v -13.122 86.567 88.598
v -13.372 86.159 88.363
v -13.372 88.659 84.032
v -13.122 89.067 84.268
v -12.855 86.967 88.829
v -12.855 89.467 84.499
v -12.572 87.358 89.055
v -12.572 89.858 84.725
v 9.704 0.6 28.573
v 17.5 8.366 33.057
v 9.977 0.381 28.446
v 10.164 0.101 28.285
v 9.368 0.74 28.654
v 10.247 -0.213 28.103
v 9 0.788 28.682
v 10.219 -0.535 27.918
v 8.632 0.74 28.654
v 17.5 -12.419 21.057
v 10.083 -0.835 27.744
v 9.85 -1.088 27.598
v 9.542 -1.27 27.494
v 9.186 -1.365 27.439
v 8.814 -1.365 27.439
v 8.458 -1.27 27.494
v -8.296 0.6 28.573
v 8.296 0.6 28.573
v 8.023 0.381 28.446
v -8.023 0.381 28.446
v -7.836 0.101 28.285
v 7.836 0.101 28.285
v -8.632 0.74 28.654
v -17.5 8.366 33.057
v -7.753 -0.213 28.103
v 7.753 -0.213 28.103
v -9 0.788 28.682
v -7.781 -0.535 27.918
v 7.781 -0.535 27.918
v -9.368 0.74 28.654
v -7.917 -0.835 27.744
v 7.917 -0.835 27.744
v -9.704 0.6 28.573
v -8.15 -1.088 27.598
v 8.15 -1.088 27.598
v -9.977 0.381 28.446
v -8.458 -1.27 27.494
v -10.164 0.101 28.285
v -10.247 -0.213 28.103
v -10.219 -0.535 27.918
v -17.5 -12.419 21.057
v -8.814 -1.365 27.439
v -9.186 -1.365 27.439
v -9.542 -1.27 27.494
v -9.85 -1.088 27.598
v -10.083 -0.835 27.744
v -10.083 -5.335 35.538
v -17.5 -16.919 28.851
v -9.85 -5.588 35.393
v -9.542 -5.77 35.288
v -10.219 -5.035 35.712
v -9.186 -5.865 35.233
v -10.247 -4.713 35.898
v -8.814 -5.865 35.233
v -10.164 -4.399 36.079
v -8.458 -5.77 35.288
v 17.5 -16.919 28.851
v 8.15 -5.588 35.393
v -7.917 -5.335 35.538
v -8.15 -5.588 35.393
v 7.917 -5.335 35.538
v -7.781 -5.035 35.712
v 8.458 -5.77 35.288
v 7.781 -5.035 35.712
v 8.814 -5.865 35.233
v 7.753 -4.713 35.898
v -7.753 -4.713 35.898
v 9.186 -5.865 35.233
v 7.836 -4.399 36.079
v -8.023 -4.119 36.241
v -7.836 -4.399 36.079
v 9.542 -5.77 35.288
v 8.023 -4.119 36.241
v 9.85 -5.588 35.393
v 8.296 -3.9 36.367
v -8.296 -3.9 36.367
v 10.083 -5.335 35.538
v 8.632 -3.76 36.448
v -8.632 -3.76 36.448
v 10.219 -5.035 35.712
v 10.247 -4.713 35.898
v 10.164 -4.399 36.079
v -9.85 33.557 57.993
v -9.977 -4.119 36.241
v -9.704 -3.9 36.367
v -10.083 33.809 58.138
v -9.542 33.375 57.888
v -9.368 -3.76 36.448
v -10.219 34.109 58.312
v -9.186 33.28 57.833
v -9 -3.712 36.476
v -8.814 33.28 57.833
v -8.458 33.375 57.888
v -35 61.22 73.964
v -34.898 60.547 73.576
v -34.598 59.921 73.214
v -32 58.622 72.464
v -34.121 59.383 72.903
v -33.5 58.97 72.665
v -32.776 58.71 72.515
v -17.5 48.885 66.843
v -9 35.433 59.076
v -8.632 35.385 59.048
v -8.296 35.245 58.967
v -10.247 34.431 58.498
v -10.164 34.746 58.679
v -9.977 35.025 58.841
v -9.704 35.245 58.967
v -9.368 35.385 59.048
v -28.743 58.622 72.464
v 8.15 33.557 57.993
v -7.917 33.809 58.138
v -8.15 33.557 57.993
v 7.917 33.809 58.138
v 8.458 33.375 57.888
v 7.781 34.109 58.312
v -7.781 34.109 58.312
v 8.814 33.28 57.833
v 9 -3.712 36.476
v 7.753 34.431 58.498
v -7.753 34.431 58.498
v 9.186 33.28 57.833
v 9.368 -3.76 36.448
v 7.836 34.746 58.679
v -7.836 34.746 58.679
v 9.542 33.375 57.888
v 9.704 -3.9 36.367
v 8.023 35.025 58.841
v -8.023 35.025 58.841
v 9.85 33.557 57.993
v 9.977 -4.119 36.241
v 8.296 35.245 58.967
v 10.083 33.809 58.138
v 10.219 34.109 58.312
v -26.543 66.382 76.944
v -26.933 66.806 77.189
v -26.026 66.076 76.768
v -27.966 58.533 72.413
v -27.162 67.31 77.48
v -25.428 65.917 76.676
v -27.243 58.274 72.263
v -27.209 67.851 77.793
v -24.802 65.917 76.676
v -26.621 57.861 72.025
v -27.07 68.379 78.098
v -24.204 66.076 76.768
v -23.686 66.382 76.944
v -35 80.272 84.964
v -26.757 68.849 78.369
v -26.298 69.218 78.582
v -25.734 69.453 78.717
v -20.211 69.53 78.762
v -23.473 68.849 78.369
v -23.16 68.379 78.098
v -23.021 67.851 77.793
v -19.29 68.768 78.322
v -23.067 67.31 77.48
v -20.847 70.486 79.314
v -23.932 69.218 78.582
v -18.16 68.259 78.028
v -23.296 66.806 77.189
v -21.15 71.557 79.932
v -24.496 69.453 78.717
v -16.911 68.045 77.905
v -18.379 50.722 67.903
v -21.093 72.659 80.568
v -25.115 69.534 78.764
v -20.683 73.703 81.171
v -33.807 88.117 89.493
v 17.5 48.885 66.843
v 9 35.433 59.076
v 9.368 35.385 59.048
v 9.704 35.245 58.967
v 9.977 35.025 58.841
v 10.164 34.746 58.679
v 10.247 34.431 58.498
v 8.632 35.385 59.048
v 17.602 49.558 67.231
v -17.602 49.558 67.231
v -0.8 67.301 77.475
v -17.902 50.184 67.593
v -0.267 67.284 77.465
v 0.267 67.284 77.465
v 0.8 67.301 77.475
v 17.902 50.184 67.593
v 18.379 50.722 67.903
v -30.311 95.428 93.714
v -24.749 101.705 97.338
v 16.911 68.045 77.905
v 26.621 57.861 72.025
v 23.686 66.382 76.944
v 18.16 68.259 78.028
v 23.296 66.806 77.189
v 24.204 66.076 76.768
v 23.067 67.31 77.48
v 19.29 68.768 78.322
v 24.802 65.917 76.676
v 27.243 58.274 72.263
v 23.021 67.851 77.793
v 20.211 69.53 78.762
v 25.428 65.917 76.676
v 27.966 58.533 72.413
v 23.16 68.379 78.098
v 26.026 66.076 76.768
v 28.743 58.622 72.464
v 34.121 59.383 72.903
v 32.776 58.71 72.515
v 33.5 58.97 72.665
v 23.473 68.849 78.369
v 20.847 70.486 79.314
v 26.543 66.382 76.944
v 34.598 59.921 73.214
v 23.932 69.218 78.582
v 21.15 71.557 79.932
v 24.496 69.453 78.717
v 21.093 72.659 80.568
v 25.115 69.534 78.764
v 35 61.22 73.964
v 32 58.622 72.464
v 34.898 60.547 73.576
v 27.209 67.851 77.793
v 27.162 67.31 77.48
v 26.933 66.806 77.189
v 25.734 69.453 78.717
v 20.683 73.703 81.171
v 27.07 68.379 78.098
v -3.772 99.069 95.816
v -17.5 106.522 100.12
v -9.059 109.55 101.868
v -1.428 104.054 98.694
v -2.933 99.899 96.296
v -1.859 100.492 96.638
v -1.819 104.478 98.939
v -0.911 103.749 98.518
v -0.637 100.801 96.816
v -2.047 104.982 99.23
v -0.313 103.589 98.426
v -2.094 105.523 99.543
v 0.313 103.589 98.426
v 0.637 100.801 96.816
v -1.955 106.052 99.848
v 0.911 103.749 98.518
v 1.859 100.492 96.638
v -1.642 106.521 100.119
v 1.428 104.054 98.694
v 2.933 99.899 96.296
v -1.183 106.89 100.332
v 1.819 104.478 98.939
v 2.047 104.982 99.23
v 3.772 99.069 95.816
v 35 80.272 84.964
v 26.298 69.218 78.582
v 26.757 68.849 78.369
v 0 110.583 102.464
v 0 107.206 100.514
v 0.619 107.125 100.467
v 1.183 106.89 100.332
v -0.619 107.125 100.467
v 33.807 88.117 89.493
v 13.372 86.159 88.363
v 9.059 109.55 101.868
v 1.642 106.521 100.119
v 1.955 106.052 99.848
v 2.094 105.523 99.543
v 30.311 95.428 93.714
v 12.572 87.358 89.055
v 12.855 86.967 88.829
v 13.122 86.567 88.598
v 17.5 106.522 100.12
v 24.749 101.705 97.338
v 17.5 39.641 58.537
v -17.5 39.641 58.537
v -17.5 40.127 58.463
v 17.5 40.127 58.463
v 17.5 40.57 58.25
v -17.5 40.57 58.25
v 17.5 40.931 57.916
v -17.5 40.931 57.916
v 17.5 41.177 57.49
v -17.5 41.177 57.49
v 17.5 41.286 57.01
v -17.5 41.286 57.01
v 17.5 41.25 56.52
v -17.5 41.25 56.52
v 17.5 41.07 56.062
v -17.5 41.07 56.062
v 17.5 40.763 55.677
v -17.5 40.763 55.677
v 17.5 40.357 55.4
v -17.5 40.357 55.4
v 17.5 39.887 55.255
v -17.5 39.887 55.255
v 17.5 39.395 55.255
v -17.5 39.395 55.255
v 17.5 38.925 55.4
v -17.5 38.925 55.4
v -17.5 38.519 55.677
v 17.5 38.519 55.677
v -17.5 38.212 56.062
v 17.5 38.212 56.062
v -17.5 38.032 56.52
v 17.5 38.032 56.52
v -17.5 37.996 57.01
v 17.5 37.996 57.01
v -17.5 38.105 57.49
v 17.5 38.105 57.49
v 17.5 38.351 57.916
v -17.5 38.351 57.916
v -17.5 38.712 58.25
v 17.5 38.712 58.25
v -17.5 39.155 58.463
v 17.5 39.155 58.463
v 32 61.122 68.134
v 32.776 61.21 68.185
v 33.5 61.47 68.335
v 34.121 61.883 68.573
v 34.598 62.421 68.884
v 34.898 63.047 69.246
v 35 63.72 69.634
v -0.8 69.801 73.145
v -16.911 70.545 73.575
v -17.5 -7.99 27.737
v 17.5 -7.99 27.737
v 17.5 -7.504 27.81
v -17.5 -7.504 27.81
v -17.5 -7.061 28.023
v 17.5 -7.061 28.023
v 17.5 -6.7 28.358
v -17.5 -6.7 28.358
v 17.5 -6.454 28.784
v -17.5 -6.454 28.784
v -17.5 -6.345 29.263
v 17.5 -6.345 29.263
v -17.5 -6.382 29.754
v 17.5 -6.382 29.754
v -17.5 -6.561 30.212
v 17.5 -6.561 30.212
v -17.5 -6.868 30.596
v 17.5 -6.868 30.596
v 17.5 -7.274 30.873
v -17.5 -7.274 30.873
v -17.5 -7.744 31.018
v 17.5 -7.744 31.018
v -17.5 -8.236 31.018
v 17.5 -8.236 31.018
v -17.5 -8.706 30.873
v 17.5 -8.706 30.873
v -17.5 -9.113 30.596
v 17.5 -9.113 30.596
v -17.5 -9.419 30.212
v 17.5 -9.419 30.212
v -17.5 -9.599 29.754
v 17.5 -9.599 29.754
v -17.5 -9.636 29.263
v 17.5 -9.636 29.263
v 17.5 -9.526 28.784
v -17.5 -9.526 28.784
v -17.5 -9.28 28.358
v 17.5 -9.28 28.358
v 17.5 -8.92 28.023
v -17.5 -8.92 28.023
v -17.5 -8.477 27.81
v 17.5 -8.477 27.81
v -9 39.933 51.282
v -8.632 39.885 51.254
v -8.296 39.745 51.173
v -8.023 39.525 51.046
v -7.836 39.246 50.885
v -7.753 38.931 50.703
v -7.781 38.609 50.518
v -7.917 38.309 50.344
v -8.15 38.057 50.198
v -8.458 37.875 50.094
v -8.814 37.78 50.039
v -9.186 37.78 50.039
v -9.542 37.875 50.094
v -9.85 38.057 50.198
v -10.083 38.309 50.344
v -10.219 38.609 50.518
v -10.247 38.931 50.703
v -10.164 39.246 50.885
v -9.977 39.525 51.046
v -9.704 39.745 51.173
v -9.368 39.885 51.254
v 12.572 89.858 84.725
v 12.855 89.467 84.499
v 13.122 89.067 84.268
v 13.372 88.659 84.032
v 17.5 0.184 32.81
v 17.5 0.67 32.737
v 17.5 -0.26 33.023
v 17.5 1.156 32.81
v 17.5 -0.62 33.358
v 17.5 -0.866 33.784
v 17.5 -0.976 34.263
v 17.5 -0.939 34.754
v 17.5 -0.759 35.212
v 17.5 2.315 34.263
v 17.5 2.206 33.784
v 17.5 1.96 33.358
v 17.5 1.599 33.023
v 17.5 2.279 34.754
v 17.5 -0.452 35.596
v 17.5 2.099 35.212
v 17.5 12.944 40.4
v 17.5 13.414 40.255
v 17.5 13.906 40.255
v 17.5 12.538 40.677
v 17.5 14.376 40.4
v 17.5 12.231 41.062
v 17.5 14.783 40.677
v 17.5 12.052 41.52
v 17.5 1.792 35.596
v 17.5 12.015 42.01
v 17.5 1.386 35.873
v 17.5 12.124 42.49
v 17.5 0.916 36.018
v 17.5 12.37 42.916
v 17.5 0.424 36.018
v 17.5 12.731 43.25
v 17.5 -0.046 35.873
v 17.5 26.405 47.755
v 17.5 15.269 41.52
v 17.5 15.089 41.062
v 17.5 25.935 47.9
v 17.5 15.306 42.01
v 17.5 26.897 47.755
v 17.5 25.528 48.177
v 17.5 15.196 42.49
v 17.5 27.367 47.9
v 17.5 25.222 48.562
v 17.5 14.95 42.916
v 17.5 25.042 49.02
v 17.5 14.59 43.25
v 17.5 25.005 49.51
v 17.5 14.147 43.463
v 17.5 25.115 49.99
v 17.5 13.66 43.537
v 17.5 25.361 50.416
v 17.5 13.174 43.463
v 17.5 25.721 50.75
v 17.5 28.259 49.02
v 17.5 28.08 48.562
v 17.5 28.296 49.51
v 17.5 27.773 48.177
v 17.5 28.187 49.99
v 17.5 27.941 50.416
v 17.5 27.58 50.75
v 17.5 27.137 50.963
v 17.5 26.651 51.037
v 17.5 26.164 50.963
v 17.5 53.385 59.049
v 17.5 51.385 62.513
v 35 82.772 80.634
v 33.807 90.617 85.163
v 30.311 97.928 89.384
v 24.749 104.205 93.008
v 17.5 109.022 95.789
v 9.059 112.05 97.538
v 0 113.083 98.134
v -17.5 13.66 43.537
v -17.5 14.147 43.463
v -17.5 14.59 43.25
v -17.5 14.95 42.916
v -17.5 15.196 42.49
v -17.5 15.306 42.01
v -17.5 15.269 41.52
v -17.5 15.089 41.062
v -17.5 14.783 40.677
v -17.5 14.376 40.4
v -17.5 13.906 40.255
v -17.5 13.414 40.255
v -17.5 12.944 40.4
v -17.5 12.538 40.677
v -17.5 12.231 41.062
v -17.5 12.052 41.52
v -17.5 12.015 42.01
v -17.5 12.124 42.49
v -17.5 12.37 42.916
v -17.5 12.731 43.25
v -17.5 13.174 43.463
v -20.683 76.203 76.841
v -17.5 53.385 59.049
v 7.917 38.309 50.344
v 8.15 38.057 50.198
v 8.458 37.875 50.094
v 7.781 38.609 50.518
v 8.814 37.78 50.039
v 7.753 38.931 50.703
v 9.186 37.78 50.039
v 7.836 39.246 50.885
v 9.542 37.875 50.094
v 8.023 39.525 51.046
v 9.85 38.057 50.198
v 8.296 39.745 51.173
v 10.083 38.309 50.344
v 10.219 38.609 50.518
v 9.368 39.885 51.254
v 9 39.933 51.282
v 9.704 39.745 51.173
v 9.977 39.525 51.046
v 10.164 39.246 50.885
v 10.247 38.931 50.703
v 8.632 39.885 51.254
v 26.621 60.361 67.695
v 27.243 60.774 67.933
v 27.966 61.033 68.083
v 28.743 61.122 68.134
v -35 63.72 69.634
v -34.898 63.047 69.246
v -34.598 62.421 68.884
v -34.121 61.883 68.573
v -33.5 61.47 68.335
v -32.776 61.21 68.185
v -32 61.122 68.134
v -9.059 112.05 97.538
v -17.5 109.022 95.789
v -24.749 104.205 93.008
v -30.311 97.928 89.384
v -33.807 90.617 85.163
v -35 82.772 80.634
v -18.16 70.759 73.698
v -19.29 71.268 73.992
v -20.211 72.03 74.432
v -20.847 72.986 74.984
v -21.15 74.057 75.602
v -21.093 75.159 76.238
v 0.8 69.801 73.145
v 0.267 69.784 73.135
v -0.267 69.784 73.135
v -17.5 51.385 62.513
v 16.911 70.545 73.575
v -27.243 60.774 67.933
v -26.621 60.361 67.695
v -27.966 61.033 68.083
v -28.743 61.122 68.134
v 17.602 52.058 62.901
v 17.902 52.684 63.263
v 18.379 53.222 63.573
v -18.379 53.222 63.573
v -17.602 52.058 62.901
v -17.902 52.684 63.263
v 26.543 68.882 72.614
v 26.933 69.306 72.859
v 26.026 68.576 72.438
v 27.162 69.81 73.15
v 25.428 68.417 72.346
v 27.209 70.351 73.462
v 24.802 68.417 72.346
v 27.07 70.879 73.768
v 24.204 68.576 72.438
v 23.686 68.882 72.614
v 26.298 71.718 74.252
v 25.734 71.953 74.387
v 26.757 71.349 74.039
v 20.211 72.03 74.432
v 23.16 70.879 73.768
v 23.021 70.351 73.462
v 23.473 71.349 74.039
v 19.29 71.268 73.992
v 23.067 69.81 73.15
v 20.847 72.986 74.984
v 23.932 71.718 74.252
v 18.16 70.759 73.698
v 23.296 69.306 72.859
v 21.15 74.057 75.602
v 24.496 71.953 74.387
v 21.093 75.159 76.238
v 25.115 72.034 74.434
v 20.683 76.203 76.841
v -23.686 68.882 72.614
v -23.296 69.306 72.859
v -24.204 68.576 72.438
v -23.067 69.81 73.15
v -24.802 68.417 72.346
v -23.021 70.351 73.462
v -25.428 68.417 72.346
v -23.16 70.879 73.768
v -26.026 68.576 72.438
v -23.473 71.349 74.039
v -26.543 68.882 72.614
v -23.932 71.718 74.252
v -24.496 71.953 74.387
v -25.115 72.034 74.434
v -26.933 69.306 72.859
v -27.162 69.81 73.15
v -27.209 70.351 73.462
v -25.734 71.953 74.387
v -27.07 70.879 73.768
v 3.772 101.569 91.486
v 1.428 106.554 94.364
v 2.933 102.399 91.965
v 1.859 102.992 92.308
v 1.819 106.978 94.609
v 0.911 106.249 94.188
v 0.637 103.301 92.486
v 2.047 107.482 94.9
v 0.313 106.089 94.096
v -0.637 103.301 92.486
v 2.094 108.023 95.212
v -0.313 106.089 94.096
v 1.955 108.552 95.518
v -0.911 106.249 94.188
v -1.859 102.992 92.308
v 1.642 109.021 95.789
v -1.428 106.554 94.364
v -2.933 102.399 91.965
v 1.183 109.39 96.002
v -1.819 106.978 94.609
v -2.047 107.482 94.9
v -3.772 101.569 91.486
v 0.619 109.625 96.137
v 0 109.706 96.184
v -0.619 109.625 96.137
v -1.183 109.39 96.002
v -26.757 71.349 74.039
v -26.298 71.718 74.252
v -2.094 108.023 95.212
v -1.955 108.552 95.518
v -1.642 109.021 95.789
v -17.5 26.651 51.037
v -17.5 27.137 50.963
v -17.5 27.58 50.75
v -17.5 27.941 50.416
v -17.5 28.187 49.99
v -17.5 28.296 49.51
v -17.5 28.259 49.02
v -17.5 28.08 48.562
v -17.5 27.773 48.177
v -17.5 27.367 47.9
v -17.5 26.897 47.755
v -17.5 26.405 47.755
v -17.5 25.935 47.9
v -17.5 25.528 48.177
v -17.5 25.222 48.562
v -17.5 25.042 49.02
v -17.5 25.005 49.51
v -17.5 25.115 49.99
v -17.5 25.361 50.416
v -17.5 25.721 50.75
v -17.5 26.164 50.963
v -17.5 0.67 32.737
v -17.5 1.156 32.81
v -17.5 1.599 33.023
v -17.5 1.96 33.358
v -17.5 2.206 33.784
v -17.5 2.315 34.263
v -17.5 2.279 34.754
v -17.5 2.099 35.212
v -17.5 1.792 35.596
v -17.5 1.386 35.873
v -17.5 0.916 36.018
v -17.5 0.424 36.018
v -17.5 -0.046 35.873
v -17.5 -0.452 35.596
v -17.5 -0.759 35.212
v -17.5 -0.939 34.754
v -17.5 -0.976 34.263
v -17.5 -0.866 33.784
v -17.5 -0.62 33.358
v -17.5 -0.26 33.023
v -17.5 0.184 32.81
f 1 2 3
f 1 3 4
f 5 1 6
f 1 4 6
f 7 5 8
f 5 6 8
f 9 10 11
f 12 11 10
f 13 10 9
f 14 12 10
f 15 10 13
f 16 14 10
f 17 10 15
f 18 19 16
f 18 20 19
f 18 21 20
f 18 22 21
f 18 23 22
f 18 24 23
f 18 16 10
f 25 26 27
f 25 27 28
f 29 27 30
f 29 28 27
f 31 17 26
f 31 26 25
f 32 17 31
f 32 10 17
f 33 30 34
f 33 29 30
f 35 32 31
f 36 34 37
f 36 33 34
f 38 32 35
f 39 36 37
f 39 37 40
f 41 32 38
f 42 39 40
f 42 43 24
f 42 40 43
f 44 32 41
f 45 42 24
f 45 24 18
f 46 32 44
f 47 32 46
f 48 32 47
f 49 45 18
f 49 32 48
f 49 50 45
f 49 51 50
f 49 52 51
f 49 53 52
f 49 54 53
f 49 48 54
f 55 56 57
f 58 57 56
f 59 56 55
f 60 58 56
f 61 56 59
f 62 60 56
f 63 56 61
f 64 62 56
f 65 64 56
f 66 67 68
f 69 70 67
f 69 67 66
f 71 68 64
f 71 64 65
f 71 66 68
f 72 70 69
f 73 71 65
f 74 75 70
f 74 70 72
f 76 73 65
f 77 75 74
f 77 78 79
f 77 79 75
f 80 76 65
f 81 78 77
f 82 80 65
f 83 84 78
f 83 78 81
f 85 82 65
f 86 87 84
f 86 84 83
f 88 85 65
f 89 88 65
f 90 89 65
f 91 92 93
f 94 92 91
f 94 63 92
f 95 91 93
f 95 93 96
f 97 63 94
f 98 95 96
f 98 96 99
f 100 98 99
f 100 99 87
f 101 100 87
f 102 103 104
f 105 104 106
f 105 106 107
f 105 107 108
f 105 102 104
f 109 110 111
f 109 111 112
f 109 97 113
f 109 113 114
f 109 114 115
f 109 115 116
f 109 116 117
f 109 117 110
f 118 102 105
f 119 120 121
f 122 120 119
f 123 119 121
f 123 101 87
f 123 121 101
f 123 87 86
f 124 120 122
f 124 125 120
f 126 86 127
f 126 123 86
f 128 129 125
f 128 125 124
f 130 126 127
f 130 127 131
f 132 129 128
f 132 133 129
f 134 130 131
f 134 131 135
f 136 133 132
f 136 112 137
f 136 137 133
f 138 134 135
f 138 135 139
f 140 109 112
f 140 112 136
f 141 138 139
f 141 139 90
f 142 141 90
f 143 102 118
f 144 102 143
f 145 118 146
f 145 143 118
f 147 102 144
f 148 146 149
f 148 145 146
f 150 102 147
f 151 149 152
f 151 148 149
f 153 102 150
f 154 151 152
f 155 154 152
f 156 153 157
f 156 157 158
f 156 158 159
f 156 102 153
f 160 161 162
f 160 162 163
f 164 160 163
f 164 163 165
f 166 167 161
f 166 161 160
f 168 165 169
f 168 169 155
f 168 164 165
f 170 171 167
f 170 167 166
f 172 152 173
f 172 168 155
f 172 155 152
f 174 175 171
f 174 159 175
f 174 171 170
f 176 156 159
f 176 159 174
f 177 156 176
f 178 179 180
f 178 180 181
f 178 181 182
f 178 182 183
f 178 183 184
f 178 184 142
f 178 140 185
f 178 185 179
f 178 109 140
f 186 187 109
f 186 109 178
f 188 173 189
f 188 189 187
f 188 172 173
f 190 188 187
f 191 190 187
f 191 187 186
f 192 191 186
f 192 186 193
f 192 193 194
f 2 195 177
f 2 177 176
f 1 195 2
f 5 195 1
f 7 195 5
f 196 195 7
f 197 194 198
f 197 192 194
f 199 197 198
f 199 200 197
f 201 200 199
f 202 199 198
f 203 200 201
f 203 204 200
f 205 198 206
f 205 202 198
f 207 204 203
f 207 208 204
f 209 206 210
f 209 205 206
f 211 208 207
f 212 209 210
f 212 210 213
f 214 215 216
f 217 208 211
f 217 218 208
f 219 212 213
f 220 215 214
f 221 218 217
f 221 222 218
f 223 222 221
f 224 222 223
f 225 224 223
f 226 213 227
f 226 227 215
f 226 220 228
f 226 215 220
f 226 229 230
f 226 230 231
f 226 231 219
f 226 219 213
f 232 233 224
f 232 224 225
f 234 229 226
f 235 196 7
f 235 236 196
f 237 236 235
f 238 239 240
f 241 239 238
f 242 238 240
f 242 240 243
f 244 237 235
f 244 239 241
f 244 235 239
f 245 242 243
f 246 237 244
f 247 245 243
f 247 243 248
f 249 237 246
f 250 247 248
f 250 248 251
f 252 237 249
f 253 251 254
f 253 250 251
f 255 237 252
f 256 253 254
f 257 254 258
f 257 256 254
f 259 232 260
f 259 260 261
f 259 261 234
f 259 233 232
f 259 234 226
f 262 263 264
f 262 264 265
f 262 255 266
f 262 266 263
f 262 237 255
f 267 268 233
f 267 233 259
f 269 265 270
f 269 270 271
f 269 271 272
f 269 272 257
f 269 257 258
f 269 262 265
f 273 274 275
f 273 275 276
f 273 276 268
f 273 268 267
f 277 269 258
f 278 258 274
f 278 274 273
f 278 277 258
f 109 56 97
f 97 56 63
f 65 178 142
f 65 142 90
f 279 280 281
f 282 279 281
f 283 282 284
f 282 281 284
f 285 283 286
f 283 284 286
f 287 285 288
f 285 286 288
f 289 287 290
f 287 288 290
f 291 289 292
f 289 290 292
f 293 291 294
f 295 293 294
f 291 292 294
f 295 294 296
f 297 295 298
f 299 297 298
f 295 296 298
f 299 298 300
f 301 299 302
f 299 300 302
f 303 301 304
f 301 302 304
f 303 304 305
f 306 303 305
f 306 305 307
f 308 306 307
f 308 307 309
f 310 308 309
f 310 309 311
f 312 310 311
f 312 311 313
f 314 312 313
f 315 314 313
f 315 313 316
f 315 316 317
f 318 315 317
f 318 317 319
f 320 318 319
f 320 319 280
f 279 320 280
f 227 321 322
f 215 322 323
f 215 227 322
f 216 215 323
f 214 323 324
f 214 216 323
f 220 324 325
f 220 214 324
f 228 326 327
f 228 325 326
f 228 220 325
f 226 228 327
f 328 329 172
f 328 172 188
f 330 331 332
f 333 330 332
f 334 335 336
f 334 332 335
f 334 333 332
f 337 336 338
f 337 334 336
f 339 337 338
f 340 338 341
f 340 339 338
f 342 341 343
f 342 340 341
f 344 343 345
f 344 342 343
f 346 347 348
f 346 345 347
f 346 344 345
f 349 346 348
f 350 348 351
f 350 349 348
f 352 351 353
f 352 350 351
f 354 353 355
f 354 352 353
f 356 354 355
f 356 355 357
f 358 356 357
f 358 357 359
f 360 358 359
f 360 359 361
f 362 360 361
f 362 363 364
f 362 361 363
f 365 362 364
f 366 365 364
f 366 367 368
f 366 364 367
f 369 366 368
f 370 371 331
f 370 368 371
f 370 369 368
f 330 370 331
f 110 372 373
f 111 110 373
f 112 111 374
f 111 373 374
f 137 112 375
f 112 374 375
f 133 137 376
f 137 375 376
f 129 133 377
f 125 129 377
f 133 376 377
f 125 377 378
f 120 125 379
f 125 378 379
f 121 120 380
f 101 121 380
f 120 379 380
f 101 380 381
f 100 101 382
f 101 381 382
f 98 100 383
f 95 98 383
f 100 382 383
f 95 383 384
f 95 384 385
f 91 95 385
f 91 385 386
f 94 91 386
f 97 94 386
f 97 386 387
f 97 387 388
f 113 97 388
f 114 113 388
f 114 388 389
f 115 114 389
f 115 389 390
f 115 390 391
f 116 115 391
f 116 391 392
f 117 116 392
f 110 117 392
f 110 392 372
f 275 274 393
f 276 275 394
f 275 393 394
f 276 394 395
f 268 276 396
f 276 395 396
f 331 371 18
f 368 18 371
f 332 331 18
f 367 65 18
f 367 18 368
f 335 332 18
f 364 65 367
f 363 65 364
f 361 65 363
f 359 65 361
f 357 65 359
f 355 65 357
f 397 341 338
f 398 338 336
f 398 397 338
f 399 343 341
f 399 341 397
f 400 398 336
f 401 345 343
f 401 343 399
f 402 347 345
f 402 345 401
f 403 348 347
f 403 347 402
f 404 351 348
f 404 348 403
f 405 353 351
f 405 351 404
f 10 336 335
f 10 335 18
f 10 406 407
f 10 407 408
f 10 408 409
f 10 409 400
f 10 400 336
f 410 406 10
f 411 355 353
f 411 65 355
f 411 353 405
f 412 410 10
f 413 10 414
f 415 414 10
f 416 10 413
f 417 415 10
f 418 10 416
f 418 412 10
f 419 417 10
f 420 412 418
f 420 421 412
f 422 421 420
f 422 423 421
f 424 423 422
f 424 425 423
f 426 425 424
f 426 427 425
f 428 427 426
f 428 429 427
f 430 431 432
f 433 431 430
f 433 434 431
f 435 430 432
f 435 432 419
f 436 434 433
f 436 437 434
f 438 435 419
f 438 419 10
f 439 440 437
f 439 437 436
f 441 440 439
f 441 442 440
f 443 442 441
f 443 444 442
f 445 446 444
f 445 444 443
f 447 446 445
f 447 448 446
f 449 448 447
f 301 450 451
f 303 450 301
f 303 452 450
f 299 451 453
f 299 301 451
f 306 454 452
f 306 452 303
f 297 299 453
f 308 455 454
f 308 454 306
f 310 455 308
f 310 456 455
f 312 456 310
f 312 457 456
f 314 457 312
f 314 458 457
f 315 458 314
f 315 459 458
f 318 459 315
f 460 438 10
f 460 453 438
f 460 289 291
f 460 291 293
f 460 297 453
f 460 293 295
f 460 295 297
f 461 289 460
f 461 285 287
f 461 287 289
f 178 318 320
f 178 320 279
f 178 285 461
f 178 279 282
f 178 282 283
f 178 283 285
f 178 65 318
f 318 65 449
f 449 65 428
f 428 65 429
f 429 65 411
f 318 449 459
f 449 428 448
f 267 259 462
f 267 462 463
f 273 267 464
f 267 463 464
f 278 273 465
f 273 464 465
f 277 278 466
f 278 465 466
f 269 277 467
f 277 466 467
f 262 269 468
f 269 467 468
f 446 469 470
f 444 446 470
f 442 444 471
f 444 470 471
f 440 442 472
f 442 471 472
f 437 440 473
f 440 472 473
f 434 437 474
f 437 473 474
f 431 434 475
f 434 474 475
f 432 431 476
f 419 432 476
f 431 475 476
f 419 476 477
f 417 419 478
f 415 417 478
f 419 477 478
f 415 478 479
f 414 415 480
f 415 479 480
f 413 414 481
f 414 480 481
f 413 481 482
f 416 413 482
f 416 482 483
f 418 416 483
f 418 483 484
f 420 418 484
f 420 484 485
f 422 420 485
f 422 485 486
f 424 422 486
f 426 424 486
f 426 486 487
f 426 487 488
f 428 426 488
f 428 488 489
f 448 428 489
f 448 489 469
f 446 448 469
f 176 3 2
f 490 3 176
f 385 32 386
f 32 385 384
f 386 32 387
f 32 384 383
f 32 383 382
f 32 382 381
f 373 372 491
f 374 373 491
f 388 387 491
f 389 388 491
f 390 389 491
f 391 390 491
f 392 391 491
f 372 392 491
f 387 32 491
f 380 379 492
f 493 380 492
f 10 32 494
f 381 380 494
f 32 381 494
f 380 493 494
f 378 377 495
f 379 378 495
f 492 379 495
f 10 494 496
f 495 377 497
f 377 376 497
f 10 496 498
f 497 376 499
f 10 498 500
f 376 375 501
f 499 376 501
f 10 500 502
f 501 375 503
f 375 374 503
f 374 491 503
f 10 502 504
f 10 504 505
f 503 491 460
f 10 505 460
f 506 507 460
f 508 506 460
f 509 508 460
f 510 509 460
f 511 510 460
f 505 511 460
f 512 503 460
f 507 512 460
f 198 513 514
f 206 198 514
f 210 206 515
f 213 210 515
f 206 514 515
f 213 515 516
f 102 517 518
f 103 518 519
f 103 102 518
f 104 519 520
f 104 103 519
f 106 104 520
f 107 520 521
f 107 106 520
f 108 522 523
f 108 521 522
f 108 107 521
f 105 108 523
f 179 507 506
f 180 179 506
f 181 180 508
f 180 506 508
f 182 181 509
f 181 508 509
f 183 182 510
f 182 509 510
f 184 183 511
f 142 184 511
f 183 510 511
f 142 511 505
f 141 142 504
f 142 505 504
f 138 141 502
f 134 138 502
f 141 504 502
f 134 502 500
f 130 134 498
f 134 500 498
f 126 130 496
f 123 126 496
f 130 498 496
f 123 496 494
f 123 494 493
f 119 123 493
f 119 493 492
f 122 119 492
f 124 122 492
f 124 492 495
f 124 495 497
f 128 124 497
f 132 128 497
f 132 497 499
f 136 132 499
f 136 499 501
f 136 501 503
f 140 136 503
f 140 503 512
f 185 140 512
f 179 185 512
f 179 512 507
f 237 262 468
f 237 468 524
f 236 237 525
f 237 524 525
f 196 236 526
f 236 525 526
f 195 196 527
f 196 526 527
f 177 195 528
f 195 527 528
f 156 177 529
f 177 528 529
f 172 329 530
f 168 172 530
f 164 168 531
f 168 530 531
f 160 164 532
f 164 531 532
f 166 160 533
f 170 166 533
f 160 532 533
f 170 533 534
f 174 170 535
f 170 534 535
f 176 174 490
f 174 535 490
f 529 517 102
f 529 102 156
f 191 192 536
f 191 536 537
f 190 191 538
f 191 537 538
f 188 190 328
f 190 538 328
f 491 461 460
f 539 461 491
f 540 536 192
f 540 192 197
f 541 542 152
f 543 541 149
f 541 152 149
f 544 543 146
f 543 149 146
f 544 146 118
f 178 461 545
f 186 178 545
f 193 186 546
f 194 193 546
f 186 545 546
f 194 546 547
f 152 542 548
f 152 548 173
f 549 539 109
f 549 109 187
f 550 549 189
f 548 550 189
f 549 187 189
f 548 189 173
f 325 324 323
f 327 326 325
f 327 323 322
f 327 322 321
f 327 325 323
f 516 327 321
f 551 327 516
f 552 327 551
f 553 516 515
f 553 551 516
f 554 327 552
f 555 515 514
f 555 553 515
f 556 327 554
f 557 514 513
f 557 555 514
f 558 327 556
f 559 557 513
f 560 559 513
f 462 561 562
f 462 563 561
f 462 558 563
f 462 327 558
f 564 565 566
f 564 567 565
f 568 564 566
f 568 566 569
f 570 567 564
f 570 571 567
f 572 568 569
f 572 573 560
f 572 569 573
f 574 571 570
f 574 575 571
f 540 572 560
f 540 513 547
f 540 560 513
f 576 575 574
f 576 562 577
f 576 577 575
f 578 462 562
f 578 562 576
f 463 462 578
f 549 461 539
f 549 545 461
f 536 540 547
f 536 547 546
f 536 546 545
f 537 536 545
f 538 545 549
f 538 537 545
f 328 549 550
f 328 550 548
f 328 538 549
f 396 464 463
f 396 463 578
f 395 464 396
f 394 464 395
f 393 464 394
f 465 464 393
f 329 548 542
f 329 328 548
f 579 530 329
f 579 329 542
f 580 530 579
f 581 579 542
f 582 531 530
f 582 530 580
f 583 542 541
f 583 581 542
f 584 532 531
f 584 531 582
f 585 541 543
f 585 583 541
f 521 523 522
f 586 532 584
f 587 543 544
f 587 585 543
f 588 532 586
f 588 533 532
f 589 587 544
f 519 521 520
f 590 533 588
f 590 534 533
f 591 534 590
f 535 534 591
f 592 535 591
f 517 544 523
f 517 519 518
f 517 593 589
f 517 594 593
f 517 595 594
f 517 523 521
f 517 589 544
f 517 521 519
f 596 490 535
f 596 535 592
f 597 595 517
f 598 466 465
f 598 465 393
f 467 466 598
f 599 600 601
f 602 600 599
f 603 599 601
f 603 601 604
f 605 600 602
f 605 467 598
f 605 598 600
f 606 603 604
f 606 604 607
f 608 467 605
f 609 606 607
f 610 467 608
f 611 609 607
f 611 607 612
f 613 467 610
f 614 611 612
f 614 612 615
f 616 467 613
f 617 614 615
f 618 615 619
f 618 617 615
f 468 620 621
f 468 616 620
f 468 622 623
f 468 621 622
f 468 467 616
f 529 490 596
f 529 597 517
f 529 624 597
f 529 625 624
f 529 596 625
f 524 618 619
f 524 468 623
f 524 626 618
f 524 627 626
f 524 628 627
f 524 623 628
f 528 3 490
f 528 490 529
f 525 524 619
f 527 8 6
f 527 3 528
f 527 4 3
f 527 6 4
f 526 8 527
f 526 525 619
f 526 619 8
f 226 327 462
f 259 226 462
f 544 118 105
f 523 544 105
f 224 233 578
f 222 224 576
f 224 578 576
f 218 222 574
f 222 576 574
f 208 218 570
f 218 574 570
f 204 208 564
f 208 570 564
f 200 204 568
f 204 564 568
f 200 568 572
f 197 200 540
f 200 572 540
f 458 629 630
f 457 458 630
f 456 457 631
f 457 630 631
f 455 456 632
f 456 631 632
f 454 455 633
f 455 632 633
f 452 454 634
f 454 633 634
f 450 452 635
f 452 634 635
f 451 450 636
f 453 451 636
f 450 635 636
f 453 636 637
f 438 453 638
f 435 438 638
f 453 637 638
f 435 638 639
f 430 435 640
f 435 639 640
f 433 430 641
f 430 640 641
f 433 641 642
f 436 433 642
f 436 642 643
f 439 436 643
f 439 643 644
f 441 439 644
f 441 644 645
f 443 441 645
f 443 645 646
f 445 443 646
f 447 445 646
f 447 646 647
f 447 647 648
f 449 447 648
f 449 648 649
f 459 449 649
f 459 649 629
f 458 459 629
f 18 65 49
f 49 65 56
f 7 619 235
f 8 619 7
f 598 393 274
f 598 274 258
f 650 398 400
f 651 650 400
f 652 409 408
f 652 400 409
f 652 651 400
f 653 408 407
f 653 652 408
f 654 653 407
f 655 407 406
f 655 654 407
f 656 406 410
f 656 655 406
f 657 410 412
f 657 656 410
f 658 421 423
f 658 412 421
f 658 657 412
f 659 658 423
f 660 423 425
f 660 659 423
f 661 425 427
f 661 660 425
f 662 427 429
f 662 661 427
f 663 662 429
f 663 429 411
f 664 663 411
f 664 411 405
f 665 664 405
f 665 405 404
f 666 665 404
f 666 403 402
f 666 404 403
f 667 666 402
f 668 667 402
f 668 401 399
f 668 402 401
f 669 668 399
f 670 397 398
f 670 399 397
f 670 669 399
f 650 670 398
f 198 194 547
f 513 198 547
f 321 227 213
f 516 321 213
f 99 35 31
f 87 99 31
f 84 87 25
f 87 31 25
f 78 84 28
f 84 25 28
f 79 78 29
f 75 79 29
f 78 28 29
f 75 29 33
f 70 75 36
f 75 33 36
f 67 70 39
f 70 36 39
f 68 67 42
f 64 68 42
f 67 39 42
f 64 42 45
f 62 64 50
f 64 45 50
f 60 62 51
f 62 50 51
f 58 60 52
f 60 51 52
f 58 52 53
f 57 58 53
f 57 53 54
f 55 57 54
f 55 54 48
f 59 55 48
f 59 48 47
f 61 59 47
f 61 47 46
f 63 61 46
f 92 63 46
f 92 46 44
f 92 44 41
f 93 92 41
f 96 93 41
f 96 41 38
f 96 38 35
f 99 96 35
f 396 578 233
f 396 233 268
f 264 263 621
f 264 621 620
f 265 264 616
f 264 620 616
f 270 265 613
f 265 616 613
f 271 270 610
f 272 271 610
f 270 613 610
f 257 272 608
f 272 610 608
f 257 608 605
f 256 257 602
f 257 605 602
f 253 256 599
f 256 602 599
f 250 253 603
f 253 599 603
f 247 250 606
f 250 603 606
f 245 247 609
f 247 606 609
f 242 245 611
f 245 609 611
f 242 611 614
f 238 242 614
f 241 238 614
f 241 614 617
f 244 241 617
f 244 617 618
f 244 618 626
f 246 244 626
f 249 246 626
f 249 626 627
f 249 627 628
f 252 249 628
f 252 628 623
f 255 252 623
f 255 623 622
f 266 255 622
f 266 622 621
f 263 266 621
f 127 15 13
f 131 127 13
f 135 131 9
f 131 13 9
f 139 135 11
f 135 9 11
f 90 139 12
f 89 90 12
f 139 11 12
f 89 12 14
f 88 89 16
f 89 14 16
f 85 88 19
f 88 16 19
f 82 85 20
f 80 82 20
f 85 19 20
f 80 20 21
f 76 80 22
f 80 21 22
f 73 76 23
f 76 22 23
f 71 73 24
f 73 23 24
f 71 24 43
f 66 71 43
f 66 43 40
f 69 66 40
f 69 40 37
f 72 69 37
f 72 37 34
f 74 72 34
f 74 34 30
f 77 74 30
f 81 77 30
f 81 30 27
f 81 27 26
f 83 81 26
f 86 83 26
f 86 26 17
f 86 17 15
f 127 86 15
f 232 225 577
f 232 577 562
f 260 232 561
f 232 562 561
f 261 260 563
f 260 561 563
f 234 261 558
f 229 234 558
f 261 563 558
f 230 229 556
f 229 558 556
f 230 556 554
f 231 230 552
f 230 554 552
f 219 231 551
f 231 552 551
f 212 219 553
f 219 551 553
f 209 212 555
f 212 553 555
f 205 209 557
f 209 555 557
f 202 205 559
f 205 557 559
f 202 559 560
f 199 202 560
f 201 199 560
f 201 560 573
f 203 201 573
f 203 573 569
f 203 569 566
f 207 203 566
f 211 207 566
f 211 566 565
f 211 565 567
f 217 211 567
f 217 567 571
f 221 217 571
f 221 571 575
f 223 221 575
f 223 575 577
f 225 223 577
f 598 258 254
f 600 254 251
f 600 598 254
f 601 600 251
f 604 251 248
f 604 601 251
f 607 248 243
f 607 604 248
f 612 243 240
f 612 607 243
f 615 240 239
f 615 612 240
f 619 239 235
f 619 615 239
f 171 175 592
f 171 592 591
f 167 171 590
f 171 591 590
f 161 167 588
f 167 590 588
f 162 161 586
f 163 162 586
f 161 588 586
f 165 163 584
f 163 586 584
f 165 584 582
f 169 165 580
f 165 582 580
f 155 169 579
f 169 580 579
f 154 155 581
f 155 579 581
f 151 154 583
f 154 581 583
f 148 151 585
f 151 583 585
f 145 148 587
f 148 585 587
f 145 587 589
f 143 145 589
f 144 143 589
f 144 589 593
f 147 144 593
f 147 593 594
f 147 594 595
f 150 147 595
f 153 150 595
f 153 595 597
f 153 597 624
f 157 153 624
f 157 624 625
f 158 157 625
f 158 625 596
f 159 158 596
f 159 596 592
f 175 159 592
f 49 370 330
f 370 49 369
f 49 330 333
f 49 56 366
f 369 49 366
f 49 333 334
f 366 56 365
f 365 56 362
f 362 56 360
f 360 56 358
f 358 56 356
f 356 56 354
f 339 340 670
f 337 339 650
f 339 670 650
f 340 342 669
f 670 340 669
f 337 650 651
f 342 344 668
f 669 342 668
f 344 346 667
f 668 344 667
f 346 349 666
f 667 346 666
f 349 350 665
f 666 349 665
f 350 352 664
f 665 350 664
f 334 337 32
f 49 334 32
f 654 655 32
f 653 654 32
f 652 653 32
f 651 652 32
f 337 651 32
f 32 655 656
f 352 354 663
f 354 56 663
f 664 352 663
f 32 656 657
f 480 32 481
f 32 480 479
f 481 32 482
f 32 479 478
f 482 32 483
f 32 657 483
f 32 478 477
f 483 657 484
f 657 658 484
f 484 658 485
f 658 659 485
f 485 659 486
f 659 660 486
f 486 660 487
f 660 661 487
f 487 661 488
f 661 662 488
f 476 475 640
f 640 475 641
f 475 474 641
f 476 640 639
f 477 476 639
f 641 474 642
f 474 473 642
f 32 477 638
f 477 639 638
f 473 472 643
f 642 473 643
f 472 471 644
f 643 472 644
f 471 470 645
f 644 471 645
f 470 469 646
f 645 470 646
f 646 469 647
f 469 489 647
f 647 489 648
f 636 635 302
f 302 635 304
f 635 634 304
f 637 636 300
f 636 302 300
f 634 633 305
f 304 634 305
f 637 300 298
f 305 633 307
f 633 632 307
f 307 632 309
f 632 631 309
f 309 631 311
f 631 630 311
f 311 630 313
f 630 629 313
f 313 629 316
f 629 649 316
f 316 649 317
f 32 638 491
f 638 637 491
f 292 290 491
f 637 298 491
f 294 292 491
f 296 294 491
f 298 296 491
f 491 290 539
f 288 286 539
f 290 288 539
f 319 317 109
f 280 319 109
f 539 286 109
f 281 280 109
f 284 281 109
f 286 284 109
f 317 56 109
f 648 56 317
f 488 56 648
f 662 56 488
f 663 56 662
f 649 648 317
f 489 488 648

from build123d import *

# Parameters (mm, degrees)
SKETCH_1_W                = 35
SKETCH_1_H                = 10
EXTRUDE_1_DEPTH           = 30
SKETCH_2_R                = 1.65
CUT_EXTRUDE_1_DEPTH       = 47.368092477
SKETCH_3_W                = 35
SKETCH_3_H                = 10
FILLET_1_R                = 5
SKETCH_6_W                = 70
SKETCH_6_H                = 60
EXTRUDE_2_DEPTH           = 10
CHAMFER_1_SIZE            = 10
CUT_EXTRUDE_3_DEPTH       = 15
SKETCH_8_R                = 15
CUT_EXTRUDE_4_DEPTH       = 15
SKETCH_10_R               = 2.1
CUT_EXTRUDE_6_DEPTH       = 156.505811286
SKETCH_11_R               = 4.5
CUT_EXTRUDE_7_DEPTH       = 156.505811286
CUT_EXTRUDE_12_DEPTH      = 25
CUT_EXTRUDE_10_DEPTH      = 156.505811286
CUT_EXTRUDE_10_DEPTH_BACK = 156.505811286
SKETCH_14_W               = 35
SKETCH_14_H               = 27.103629711
SKETCH_15_W               = 35
SKETCH_15_H               = 10
EXTRUDE_3_DEPTH           = 23
CUT_EXTRUDE_11_DEPTH      = 164.332579917
CUT_EXTRUDE_11_DEPTH_BACK = 164.332579917
SKETCH_16_R               = 1.65
FILLET_2_R                = 3
CUT_EXTRUDE_START         = -4
CUT_EXTRUDE_13_DEPTH      = 4
SKETCH_19_W               = 35
SKETCH_19_H               = 24
EXTRUDE_4_DEPTH           = 6
CUT_EXTRUDE_14_DEPTH      = 162.92960956
CUT_EXTRUDE_14_DEPTH_BACK = 162.92960956
SKETCH_20_R               = 1.65
CUT_EXTRUDE_15_DEPTH      = 1
SKETCH_22_R               = 1.65
CUT_EXTRUDE_16_DEPTH      = 162.378361072
CUT_EXTRUDE_17_DEPTH      = 162.378361072
CUT_EXTRUDE_17_DEPTH_BACK = 162.378361072
SKETCH_25_R               = 1.25
CUT_EXTRUDE_18_DEPTH      = 10


with BuildPart() as part:
    # 草图1 → 凸台-拉伸1 (new body)
    with BuildSketch(Plane.XY):
        Rectangle(SKETCH_1_W, SKETCH_1_H)
    extrude(amount=EXTRUDE_1_DEPTH)

    # 草图2 → 切除-拉伸1 (cut, through all)
    with BuildSketch(Plane(origin=(17.5, 0, 0), x_dir=(0, 0, -1), z_dir=(1, 0, 0))):
        with Locations((-26, 0)):
            Circle(SKETCH_2_R)
        with Locations((-4, 0)):
            Circle(SKETCH_2_R)
    extrude(amount=-CUT_EXTRUDE_1_DEPTH, mode=Mode.SUBTRACT)

    # 扫描3: sweep along a path in 草图4
    with BuildLine(Plane(origin=(0, 0, 0), x_dir=(0, 0, -1), z_dir=(1, 0, 0))) as sweep_3_path:
        Line((-30, 0), (-31.113248654, 0))
        ThreePointArc((-31.113248654, 0), (-33.613248654, 0.669872981), (-35.443375673, 2.5))
        Line((-35.443375673, 2.5), (-99, 112.583302492))
    # 草图3 → 扫描3 (sweep)
    with BuildSketch(Plane.XY.offset(30)):
        Rectangle(SKETCH_3_W, SKETCH_3_H)
    sweep(path=sweep_3_path.line)

    # 圆角1
    fillet_1_edges = [part.edges().sort_by_distance(p)[0] for p in [
        (0, 5, 31.113248654),
    ]]
    fillet(fillet_1_edges, radius=FILLET_1_R)

    # 草图6 → 凸台-拉伸2 (add)
    with BuildSketch(Plane(origin=(0, -12.222431864, 21.169872981), x_dir=(-1, 0, 0), z_dir=(0, 0.4999999999999983, -0.8660254037844396))):
        with Locations((0, 117)):
            Rectangle(SKETCH_6_W, SKETCH_6_H)
    extrude(amount=-EXTRUDE_2_DEPTH)

    # 倒角1
    chamfer_1_edges = [part.edges().sort_by_distance(p)[0] for p in [
        (17.5, 60.621778265, 69),
        (-17.5, 60.621778265, 69),
    ]]
    chamfer(chamfer_1_edges, length=CHAMFER_1_SIZE)

    # 草图7 → 切除-拉伸3 (cut)
    with BuildSketch(Plane(origin=(0, -12.222431864, 21.169872981), x_dir=(-1, 0, 0), z_dir=(0, 0.4999999999999983, -0.8660254037844396))):
        with BuildLine():
            Line((-35, 147), (-35, 112))
            ThreePointArc((-35, 112), (-24.748737372, 136.748737311), (-8.6e-08, 147))
            Line((-8.6e-08, 147), (-35, 147))
        make_face()
        with BuildLine():
            ThreePointArc((-8.6e-08, 147), (24.748737311, 136.748737372), (35, 112))
            Line((35, 112), (35, 147))
            Line((35, 147), (-8.6e-08, 147))
        make_face()
    extrude(amount=-CUT_EXTRUDE_3_DEPTH, mode=Mode.SUBTRACT)

    # 草图8 → 切除-拉伸4 (cut)
    with BuildSketch(Plane(origin=(0, -12.222431864, 21.169872981), x_dir=(-1, 0, 0), z_dir=(0, 0.4999999999999983, -0.8660254037844396))):
        with Locations(Location((0, 112, 0), (0, 0, 90))):
            Circle(SKETCH_8_R)
    extrude(amount=-CUT_EXTRUDE_4_DEPTH, mode=Mode.SUBTRACT)

    # 草图10 → 切除-拉伸6 (cut, through all)
    with BuildSketch(Plane(origin=(0, -12.222431864, 21.169872981), x_dir=(-1, 0, 0), z_dir=(0, 0.4999999999999983, -0.8660254037844396))):
        with Locations(Location((0, 141, 0), (0, 0, 90))):
            Circle(SKETCH_10_R)
        with Locations(Location((-25.11473671, 97.5, 0), (0, 0, 90))):
            Circle(SKETCH_10_R)
        with Locations(Location((25.11473671, 97.5, 0), (0, 0, 90))):
            Circle(SKETCH_10_R)
    extrude(amount=-CUT_EXTRUDE_6_DEPTH, mode=Mode.SUBTRACT)

    # 草图11 → 切除-拉伸7 (cut, through all)
    with BuildSketch(Plane(origin=(0, -12.222431864, 21.169872981), x_dir=(-1, 0, 0), z_dir=(0, 0.4999999999999983, -0.8660254037844396))):
        with Locations((-16.670989023, 102.375)):
            Circle(SKETCH_11_R)
        with Locations((16.670989023, 102.375)):
            Circle(SKETCH_11_R)
    extrude(amount=-CUT_EXTRUDE_7_DEPTH, mode=Mode.SUBTRACT)

    # 草图12 → 切除-拉伸12 (cut)
    with BuildSketch(Plane(origin=(0, -12.222431864, 21.169872981), x_dir=(-1, 0, 0), z_dir=(0, 0.4999999999999983, -0.8660254037844396))):
        with BuildLine():
            Line((-20.682503653, 104.414056246), (-13.371715434, 118.796854152))
            ThreePointArc((-13.371715434, 118.796854152), (-12.990381057, 119.5), (-12.572106078, 120.181818182))
            Line((-12.572106078, 120.181818182), (-3.771631823, 133.704545455))
            ThreePointArc((-3.771631823, 133.704545455), (0, 135.75), (3.771631823, 133.704545455))
            Line((3.771631823, 133.704545455), (12.572106078, 120.181818182))
            ThreePointArc((12.572106078, 120.181818182), (12.990381057, 119.5), (13.371715434, 118.796854152))
            Line((13.371715434, 118.796854152), (20.682503653, 104.414056246))
            ThreePointArc((20.682503653, 104.414056246), (20.56810334, 100.125), (16.91087183, 97.8813983))
            Line((16.91087183, 97.8813983), (0.799609356, 97.021327666))
            ThreePointArc((0.799609356, 97.021327666), (0, 97), (-0.799609356, 97.021327666))
            Line((-0.799609356, 97.021327666), (-16.91087183, 97.8813983))
            ThreePointArc((-16.91087183, 97.8813983), (-20.56810334, 100.125), (-20.682503653, 104.414056246))
        make_face()
    extrude(amount=-CUT_EXTRUDE_12_DEPTH, mode=Mode.SUBTRACT)

    # 草图14 → 切除-拉伸10 (cut, two sides: drawn at the far end of the back side and taken through both)
    with BuildSketch(Plane(origin=(0, -12.222431864, 21.169872981), x_dir=(-1, 0, 0), z_dir=(0, 0.4999999999999983, -0.8660254037844396)).offset(-CUT_EXTRUDE_10_DEPTH_BACK)):
        with Locations((0, 9.221687837)):
            Rectangle(SKETCH_14_W, SKETCH_14_H)
    extrude(amount=CUT_EXTRUDE_10_DEPTH + CUT_EXTRUDE_10_DEPTH_BACK, mode=Mode.SUBTRACT)

    # 草图15 → 凸台-拉伸3 (add)
    with BuildSketch(Plane(origin=(0, 19.722431864, 11.386751346), x_dir=(1, 0, 0), z_dir=(0, -0.8660254037844397, -0.4999999999999984))):
        with Locations((0, 29.444863729)):
            Rectangle(SKETCH_15_W, SKETCH_15_H)
    extrude(amount=EXTRUDE_3_DEPTH)

    # 草图16 → 切除-拉伸11 (cut, two sides: drawn at the far end of the back side and taken through both)
    with BuildSketch(Plane(origin=(17.5, 0, 0), x_dir=(0, 0, -1), z_dir=(1, 0, 0)).offset(-CUT_EXTRUDE_11_DEPTH_BACK)):
        with Locations((-29.386751346, -7.990381057)):
            Circle(SKETCH_16_R)
        with Locations((-34.386751346, 0.669872981)):
            Circle(SKETCH_16_R)
    extrude(amount=CUT_EXTRUDE_11_DEPTH + CUT_EXTRUDE_11_DEPTH_BACK, mode=Mode.SUBTRACT)

    # 圆角2
    fillet_2_edges = [part.edges().sort_by_distance(p)[0] for p in [
        (-35, 60.621778265, 69),
        (35, 60.621778265, 69),
        (-17.5, 51.961524227, 64),
        (-27.5, 60.621778265, 69),
        (27.5, 60.621778265, 69),
        (17.5, 51.961524227, 64),
    ]]
    fillet(fillet_2_edges, radius=FILLET_2_R)

    # 草图18 → 切除-拉伸13 (cut)
    with BuildSketch(Plane(origin=(0, -12.222431864, 21.169872981), x_dir=(-1, 0, 0), z_dir=(0, 0.4999999999999983, -0.8660254037844396)).offset(CUT_EXTRUDE_START)):
        with BuildLine():
            Line((-17.5, 75.757359313), (17.5, 75.757359313))
            ThreePointArc((17.5, 75.757359313), (17.728361402, 76.90540961), (18.378679656, 77.878679656))
            Line((18.378679656, 77.878679656), (26.621320344, 86.121320344))
            ThreePointArc((26.621320344, 86.121320344), (27.59459039, 86.771638598), (28.742640687, 87))
            Line((28.742640687, 87), (32, 87))
            ThreePointArc((32, 87), (34.121320344, 87.878679656), (35, 90))
            Line((35, 90), (35, 112))
            ThreePointArc((35, 112), (0, 147), (-35, 112))
            Line((-35, 112), (-35, 90))
            ThreePointArc((-35, 90), (-34.121320344, 87.878679656), (-32, 87))
            Line((-32, 87), (-28.742640687, 87))
            ThreePointArc((-28.742640687, 87), (-27.59459039, 86.771638598), (-26.621320344, 86.121320344))
            Line((-26.621320344, 86.121320344), (-18.378679656, 77.878679656))
            ThreePointArc((-18.378679656, 77.878679656), (-17.728361402, 76.90540961), (-17.5, 75.757359313))
        make_face()
    extrude(amount=CUT_EXTRUDE_13_DEPTH, mode=Mode.SUBTRACT)

    # 草图19 → 凸台-拉伸4 (add)
    with BuildSketch(Plane(origin=(0, -12.222431864, 21.169872981), x_dir=(-1, 0, 0), z_dir=(0, 0.4999999999999983, -0.8660254037844396))):
        with Locations((0, 11.773502692)):
            Rectangle(SKETCH_19_W, SKETCH_19_H)
    extrude(amount=EXTRUDE_4_DEPTH)

    # 草图20 → 切除-拉伸14 (cut, two sides: drawn at the far end of the back side and taken through both)
    with BuildSketch(Plane.ZY.offset(17.5).offset(-CUT_EXTRUDE_14_DEPTH_BACK)):
        with Locations(Location((29.386751346, -7.990381057, 0), (0, 0, 180))):
            Circle(SKETCH_20_R)
        with Locations(Location((34.386751346, 0.669872981, 0), (0, 0, 180))):
            Circle(SKETCH_20_R)
        with Locations((22.458548116, -3.990381057)):
            Circle(SKETCH_20_R)
        with Locations((27.458548116, 4.669872981)):
            Circle(SKETCH_20_R)
    extrude(amount=CUT_EXTRUDE_14_DEPTH + CUT_EXTRUDE_14_DEPTH_BACK, mode=Mode.SUBTRACT)

    # 草图21 → 切除-拉伸15 (cut)
    with BuildSketch(Plane(origin=(0, -17.222431864, 29.830127019), x_dir=(1, 0, 0), z_dir=(0, -0.4999999999999983, 0.8660254037844396))):
        with BuildLine():
            Line((-35, 112), (-35, 90))
            ThreePointArc((-35, 90), (-34.121320344, 87.878679656), (-32, 87))
            Line((-32, 87), (-28.742640687, 87))
            ThreePointArc((-28.742640687, 87), (-27.59459039, 86.771638598), (-26.621320344, 86.121320344))
            Line((-26.621320344, 86.121320344), (-18.378679656, 77.878679656))
            ThreePointArc((-18.378679656, 77.878679656), (-17.728361402, 76.90540961), (-17.5, 75.757359313))
            Line((-17.5, 75.757359313), (-17.5, -0.226497308))
            Line((-17.5, -0.226497308), (17.5, -0.226497308))
            Line((17.5, -0.226497308), (17.5, 75.757359313))
            ThreePointArc((17.5, 75.757359313), (17.728361402, 76.90540961), (18.378679656, 77.878679656))
            Line((18.378679656, 77.878679656), (26.621320344, 86.121320344))
            ThreePointArc((26.621320344, 86.121320344), (27.59459039, 86.771638598), (28.742640687, 87))
            Line((28.742640687, 87), (32, 87))
            ThreePointArc((32, 87), (34.121320344, 87.878679656), (35, 90))
            Line((35, 90), (35, 112))
            ThreePointArc((35, 112), (0, 147), (-35, 112))
        make_face()
    extrude(amount=-CUT_EXTRUDE_15_DEPTH, mode=Mode.SUBTRACT)

    # 草图22 → 切除-拉伸16 (cut, through all)
    with BuildSketch(Plane.ZY.offset(17.5)):
        with Locations((49.386751346, 26.650635095)):
            Circle(SKETCH_22_R)
        with Locations((56.886751346, 39.641016151)):
            Circle(SKETCH_22_R)
        with Locations((41.886751346, 13.660254038)):
            Circle(SKETCH_22_R)
    extrude(amount=-CUT_EXTRUDE_16_DEPTH, mode=Mode.SUBTRACT)

    # 草图23 → 切除-拉伸17 (cut, two sides: drawn at the far end of the back side and taken through both)
    with BuildSketch(Plane(origin=(17.5, 0, 0), x_dir=(0, 0, -1), z_dir=(1, 0, 0)).offset(-CUT_EXTRUDE_17_DEPTH_BACK)):
        Polygon((-59.048552638, 53.385365824), (-21.056624327, -12.418584287), (-8.944037263, -5.425378885), align=None)
    extrude(amount=CUT_EXTRUDE_17_DEPTH + CUT_EXTRUDE_17_DEPTH_BACK, mode=Mode.SUBTRACT)

    # 草图25 → 切除-拉伸18 (cut)
    with BuildSketch(Plane(origin=(0, -12.222431864, 21.169872981), x_dir=(-1, 0, 0), z_dir=(0, 0.4999999999999981, -0.8660254037844397))):
        with Locations(Location((-9, 58.973502692, 0), (0, 0, 90))):
            Circle(SKETCH_25_R)
        with Locations(Location((9, 58.973502692, 0), (0, 0, 90))):
            Circle(SKETCH_25_R)
        with Locations(Location((-9, 13.773502692, 0), (0, 0, 90))):
            Circle(SKETCH_25_R)
        with Locations(Location((9, 13.773502692, 0), (0, 0, 90))):
            Circle(SKETCH_25_R)
    extrude(amount=-CUT_EXTRUDE_18_DEPTH, mode=Mode.SUBTRACT)


solid = part.part
